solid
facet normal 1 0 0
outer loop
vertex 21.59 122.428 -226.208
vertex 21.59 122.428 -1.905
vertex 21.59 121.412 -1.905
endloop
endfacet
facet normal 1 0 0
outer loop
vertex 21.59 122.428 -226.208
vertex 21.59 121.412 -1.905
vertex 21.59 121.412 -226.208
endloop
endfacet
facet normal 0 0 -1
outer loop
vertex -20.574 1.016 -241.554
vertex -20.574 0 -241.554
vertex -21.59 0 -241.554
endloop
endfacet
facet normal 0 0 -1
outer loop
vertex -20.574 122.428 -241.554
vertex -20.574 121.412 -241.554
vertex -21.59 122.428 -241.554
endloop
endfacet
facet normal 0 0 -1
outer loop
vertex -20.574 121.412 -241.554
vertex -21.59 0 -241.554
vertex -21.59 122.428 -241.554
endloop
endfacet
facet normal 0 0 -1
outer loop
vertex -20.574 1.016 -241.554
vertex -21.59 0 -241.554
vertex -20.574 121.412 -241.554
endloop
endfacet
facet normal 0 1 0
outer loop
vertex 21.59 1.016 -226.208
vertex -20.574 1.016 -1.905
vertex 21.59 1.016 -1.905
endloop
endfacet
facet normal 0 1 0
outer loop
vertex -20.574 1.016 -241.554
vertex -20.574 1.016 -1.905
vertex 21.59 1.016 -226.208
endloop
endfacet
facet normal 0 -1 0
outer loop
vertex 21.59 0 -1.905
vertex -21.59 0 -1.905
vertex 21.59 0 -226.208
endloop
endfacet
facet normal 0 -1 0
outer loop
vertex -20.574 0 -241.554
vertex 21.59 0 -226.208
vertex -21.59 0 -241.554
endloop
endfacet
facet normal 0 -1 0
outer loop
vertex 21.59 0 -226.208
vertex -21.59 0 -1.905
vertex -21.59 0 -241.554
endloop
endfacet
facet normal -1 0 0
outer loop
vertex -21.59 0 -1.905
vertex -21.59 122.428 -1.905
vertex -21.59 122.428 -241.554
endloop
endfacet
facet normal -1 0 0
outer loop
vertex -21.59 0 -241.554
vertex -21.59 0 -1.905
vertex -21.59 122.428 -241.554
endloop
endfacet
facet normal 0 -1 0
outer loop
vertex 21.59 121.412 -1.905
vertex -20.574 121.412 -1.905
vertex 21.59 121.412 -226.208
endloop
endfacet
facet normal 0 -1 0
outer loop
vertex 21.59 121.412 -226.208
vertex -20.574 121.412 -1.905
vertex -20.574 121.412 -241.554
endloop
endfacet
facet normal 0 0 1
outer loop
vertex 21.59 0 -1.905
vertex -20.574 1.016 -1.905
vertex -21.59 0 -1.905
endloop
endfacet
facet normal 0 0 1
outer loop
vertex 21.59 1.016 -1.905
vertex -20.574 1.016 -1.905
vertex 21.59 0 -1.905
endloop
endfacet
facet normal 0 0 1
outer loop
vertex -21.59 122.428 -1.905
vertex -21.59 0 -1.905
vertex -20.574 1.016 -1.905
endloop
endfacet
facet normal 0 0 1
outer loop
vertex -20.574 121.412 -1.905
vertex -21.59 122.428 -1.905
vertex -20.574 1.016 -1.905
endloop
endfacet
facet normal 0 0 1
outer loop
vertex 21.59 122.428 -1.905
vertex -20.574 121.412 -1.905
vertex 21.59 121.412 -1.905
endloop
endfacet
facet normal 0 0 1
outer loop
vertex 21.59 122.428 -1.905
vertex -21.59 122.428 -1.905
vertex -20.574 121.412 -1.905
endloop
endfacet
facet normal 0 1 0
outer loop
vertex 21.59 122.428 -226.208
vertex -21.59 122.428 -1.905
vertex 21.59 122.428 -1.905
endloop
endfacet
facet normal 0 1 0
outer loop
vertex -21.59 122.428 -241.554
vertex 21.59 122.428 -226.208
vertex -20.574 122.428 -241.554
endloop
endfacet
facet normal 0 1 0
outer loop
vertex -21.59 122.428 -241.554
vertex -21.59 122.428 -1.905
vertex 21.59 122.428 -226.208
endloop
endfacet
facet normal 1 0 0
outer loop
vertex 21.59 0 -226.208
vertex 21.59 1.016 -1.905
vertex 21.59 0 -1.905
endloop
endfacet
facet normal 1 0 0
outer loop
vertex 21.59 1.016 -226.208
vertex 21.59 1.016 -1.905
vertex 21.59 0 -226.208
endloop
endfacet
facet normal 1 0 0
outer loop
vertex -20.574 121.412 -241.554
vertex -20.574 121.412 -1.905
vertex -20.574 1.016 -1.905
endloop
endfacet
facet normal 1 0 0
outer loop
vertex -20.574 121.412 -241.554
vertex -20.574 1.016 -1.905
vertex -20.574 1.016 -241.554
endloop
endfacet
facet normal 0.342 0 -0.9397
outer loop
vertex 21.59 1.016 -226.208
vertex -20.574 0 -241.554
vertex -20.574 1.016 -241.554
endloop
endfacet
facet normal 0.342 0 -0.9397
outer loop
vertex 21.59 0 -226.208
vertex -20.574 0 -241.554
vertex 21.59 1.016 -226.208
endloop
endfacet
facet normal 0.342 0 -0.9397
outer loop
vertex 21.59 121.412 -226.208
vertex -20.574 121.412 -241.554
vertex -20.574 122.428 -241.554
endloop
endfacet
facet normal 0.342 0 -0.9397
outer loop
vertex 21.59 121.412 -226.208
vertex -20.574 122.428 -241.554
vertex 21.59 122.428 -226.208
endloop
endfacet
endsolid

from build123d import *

# Parameters (mm, degrees)
BOSS_EXTRUDE1_DEPTH      = 21.59
BOSS_EXTRUDE1_DEPTH_BACK = 21.59
SKETCH3_W                = 241.554
SKETCH3_H                = 122.428
SHELL2_T                 = -1.016
CUT_EXTRUDE2_DEPTH       = 272.66721959
CUT_EXTRUDE2_DEPTH_BACK  = 272.66721959
MOVE_START               = -1.905
MOVE_FACE1_DEPTH         = 1.905


# Read off the part's stored shape, not the designer's step: Move Face1
with BuildPart() as part:
    # Sketch3 → Boss-Extrude1 (new, two sides: drawn at the far end of the back side and taken through both)
    with BuildSketch(Plane(origin=(0, 0, 0), x_dir=(0, 0, -1), z_dir=(1, 0, 0)).offset(-BOSS_EXTRUDE1_DEPTH_BACK)):
        with Locations((120.777, 61.214)):
            Rectangle(SKETCH3_W, SKETCH3_H)
    extrude(amount=BOSS_EXTRUDE1_DEPTH + BOSS_EXTRUDE1_DEPTH_BACK)

    # Shell2
    shell2_openings = [part.faces().sort_by_distance(p)[0] for p in [
        (21.59, 61.214, -120.777),
        (0, 61.214, -241.554),
        (0, 61.214, 0),
    ]]
    offset(amount=SHELL2_T, openings=shell2_openings, kind=Kind.INTERSECTION)

    # Sketch8 → Cut-Extrude2 (cut, two sides: drawn at the far end of the back side and taken through both)
    with BuildSketch(Plane(origin=(0, 122.428, 0), x_dir=(1, 0, 0), z_dir=(0, 1, 0)).offset(-CUT_EXTRUDE2_DEPTH_BACK)):
        Polygon((-490.808059193, 412.705200685), (-20.574, 241.554), (21.59, 226.207559042), (491.824059193, 55.056358358), (834.126460562, 995.524476744), (-148.505657824, 1353.173319071), align=None)
    extrude(amount=CUT_EXTRUDE2_DEPTH + CUT_EXTRUDE2_DEPTH_BACK, mode=Mode.SUBTRACT)

    # Move Face1 outline → Move Face1 (cut)
    with BuildSketch(Plane.XY.offset(MOVE_START)):
        Polygon((-21.59, 0), (21.59, 0), (21.59, 1.016), (-20.574, 1.016), (-20.574, 121.412), (21.59, 121.412), (21.59, 122.428), (-21.59, 122.428), align=None)
    extrude(amount=MOVE_FACE1_DEPTH, mode=Mode.SUBTRACT)


solid = part.part
